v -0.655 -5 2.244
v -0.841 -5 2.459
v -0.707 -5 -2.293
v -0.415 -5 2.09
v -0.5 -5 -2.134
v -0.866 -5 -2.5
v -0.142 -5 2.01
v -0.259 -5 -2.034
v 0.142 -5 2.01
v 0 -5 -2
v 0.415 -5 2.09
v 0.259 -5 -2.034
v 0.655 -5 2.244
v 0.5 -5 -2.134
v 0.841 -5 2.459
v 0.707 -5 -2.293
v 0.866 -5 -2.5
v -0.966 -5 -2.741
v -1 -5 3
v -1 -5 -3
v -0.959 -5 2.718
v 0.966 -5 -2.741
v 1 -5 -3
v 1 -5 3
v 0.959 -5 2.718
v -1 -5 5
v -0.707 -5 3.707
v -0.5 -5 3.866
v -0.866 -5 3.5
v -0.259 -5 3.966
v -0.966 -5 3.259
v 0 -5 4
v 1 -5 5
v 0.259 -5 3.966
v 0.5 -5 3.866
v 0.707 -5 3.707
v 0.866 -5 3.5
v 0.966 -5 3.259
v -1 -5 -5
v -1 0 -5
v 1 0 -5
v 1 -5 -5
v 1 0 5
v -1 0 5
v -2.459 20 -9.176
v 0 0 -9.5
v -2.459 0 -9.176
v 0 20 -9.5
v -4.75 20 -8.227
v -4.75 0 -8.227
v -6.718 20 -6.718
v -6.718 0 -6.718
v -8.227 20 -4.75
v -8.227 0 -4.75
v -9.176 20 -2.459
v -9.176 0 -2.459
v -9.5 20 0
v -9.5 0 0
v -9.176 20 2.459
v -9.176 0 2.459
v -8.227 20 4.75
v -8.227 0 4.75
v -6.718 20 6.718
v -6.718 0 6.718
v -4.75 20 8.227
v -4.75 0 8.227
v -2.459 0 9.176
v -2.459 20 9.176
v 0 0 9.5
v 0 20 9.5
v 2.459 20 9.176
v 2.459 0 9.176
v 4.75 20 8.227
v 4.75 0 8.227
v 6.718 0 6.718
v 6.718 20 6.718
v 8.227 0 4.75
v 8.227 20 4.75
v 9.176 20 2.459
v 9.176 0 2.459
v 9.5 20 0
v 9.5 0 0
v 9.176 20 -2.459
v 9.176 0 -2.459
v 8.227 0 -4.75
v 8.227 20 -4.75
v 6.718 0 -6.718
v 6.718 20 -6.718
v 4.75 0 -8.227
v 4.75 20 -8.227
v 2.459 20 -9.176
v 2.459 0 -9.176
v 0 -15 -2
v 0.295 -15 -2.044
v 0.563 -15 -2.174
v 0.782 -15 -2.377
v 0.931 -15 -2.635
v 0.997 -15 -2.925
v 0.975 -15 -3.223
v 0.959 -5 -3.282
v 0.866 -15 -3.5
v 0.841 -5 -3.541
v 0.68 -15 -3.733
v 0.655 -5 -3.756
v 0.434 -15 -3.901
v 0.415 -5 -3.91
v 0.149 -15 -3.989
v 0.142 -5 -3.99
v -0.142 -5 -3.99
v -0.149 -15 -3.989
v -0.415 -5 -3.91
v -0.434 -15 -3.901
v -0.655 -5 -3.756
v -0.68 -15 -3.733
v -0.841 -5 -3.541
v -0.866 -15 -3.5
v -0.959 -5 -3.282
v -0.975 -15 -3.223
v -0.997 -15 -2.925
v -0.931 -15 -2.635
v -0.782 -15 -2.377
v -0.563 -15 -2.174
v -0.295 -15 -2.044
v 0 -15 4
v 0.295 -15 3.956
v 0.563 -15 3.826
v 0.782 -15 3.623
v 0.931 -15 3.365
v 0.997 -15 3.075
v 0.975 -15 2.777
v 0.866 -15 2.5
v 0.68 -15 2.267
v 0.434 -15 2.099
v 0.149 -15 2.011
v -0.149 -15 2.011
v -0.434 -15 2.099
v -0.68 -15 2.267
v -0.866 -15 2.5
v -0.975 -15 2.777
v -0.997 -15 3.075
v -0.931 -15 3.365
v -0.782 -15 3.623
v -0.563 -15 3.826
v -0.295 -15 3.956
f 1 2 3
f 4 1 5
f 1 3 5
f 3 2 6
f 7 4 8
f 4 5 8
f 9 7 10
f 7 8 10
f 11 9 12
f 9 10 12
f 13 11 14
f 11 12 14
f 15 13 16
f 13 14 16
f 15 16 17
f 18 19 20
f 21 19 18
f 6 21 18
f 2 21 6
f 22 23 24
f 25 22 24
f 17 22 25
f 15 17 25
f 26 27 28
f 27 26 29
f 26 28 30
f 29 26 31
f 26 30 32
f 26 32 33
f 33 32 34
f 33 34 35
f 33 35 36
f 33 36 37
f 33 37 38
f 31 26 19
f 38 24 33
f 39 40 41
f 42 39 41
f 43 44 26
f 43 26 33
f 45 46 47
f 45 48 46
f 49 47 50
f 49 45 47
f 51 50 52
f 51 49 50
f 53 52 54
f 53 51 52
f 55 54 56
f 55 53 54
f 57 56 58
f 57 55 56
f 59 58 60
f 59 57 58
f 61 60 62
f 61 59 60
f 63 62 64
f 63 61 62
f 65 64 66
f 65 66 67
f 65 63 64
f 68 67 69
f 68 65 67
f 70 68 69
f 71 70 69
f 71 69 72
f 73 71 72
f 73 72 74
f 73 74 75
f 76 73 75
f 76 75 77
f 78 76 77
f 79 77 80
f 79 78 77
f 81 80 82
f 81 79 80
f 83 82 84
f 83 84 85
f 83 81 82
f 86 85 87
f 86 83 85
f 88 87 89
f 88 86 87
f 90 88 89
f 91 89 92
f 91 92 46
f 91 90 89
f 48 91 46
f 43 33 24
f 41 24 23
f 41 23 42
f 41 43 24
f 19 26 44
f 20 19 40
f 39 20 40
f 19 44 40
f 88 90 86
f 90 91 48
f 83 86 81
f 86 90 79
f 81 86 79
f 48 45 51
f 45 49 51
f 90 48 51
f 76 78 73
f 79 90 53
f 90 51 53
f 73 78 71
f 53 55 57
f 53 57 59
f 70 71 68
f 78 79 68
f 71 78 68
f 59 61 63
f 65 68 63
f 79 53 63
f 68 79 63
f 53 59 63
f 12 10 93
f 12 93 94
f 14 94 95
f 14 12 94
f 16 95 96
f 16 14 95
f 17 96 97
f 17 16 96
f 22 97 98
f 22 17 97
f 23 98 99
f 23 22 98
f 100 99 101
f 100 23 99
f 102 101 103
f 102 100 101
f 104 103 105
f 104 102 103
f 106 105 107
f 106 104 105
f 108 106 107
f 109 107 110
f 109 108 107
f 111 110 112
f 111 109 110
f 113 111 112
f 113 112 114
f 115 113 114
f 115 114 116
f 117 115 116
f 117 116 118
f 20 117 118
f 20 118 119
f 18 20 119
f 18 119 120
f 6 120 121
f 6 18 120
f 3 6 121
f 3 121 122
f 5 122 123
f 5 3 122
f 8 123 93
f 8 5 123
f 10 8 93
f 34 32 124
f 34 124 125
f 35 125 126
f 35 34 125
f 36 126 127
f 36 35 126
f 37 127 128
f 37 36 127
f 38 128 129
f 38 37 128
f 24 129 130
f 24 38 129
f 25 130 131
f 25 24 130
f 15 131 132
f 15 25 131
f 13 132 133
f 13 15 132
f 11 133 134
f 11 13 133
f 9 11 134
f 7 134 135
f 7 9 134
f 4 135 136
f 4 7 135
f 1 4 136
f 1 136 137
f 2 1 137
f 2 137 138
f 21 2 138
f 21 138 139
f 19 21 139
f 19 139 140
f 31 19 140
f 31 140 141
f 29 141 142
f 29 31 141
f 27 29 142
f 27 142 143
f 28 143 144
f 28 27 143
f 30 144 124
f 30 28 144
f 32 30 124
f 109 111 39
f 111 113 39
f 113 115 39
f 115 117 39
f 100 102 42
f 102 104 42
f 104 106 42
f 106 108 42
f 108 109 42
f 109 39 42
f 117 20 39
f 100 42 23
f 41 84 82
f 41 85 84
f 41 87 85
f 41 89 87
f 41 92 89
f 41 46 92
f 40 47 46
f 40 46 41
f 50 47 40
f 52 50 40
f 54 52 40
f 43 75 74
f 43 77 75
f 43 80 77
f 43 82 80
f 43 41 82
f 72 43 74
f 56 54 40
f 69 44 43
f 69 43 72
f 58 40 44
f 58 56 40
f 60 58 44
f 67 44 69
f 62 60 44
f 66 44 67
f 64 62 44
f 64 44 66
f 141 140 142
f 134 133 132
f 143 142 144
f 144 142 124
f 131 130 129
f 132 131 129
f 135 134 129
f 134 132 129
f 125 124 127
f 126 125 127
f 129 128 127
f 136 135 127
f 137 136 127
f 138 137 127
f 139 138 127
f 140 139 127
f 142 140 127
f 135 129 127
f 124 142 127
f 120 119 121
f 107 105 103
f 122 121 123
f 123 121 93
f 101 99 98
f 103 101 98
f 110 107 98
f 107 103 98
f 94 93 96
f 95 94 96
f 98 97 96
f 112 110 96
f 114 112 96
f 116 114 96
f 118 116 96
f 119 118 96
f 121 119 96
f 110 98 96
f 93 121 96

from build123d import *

# Parameters (mm, degrees)
SKETCH_1_W        = 9.5
SKETCH_1_H        = 20
SKETCH_2_R        = 1
EXTRUDE_457_DEPTH = 15
SKETCH_3_W        = 2
SKETCH_3_H        = 10
EXTRUDE_556_DEPTH = 5


with BuildPart() as part:
    # Эскиз1 → Revolve 326 (revolve)
    with BuildSketch(Plane.XY, mode=Mode.PRIVATE) as revolve_326_sk:
        with Locations((4.75, 10)):
            Rectangle(SKETCH_1_W, SKETCH_1_H)
    revolve(revolve_326_sk.sketch.rotate(Axis((0, 0, 0), (0, 1, 0)), 90), axis=Axis((0, 0, 0), (0, 1, 0)))

    # Эскиз2 → Extrude 457 (add)
    with BuildSketch(Plane(origin=(0, 0, 0), x_dir=(1, 0, 0), z_dir=(0, 1, 0))):
        with Locations(Location((0, -3, 0), (0, 0, 270))):
            Circle(SKETCH_2_R)
        with Locations(Location((0, 3, 0), (0, 0, 270))):
            Circle(SKETCH_2_R)
    extrude(amount=-EXTRUDE_457_DEPTH)

    # Эскиз3 → Extrude 556 (add)
    with BuildSketch(Plane(origin=(0, 0, 0), x_dir=(1, 0, 0), z_dir=(0, 1, 0))):
        Rectangle(SKETCH_3_W, SKETCH_3_H)
    extrude(amount=-EXTRUDE_556_DEPTH)


solid = part.part
